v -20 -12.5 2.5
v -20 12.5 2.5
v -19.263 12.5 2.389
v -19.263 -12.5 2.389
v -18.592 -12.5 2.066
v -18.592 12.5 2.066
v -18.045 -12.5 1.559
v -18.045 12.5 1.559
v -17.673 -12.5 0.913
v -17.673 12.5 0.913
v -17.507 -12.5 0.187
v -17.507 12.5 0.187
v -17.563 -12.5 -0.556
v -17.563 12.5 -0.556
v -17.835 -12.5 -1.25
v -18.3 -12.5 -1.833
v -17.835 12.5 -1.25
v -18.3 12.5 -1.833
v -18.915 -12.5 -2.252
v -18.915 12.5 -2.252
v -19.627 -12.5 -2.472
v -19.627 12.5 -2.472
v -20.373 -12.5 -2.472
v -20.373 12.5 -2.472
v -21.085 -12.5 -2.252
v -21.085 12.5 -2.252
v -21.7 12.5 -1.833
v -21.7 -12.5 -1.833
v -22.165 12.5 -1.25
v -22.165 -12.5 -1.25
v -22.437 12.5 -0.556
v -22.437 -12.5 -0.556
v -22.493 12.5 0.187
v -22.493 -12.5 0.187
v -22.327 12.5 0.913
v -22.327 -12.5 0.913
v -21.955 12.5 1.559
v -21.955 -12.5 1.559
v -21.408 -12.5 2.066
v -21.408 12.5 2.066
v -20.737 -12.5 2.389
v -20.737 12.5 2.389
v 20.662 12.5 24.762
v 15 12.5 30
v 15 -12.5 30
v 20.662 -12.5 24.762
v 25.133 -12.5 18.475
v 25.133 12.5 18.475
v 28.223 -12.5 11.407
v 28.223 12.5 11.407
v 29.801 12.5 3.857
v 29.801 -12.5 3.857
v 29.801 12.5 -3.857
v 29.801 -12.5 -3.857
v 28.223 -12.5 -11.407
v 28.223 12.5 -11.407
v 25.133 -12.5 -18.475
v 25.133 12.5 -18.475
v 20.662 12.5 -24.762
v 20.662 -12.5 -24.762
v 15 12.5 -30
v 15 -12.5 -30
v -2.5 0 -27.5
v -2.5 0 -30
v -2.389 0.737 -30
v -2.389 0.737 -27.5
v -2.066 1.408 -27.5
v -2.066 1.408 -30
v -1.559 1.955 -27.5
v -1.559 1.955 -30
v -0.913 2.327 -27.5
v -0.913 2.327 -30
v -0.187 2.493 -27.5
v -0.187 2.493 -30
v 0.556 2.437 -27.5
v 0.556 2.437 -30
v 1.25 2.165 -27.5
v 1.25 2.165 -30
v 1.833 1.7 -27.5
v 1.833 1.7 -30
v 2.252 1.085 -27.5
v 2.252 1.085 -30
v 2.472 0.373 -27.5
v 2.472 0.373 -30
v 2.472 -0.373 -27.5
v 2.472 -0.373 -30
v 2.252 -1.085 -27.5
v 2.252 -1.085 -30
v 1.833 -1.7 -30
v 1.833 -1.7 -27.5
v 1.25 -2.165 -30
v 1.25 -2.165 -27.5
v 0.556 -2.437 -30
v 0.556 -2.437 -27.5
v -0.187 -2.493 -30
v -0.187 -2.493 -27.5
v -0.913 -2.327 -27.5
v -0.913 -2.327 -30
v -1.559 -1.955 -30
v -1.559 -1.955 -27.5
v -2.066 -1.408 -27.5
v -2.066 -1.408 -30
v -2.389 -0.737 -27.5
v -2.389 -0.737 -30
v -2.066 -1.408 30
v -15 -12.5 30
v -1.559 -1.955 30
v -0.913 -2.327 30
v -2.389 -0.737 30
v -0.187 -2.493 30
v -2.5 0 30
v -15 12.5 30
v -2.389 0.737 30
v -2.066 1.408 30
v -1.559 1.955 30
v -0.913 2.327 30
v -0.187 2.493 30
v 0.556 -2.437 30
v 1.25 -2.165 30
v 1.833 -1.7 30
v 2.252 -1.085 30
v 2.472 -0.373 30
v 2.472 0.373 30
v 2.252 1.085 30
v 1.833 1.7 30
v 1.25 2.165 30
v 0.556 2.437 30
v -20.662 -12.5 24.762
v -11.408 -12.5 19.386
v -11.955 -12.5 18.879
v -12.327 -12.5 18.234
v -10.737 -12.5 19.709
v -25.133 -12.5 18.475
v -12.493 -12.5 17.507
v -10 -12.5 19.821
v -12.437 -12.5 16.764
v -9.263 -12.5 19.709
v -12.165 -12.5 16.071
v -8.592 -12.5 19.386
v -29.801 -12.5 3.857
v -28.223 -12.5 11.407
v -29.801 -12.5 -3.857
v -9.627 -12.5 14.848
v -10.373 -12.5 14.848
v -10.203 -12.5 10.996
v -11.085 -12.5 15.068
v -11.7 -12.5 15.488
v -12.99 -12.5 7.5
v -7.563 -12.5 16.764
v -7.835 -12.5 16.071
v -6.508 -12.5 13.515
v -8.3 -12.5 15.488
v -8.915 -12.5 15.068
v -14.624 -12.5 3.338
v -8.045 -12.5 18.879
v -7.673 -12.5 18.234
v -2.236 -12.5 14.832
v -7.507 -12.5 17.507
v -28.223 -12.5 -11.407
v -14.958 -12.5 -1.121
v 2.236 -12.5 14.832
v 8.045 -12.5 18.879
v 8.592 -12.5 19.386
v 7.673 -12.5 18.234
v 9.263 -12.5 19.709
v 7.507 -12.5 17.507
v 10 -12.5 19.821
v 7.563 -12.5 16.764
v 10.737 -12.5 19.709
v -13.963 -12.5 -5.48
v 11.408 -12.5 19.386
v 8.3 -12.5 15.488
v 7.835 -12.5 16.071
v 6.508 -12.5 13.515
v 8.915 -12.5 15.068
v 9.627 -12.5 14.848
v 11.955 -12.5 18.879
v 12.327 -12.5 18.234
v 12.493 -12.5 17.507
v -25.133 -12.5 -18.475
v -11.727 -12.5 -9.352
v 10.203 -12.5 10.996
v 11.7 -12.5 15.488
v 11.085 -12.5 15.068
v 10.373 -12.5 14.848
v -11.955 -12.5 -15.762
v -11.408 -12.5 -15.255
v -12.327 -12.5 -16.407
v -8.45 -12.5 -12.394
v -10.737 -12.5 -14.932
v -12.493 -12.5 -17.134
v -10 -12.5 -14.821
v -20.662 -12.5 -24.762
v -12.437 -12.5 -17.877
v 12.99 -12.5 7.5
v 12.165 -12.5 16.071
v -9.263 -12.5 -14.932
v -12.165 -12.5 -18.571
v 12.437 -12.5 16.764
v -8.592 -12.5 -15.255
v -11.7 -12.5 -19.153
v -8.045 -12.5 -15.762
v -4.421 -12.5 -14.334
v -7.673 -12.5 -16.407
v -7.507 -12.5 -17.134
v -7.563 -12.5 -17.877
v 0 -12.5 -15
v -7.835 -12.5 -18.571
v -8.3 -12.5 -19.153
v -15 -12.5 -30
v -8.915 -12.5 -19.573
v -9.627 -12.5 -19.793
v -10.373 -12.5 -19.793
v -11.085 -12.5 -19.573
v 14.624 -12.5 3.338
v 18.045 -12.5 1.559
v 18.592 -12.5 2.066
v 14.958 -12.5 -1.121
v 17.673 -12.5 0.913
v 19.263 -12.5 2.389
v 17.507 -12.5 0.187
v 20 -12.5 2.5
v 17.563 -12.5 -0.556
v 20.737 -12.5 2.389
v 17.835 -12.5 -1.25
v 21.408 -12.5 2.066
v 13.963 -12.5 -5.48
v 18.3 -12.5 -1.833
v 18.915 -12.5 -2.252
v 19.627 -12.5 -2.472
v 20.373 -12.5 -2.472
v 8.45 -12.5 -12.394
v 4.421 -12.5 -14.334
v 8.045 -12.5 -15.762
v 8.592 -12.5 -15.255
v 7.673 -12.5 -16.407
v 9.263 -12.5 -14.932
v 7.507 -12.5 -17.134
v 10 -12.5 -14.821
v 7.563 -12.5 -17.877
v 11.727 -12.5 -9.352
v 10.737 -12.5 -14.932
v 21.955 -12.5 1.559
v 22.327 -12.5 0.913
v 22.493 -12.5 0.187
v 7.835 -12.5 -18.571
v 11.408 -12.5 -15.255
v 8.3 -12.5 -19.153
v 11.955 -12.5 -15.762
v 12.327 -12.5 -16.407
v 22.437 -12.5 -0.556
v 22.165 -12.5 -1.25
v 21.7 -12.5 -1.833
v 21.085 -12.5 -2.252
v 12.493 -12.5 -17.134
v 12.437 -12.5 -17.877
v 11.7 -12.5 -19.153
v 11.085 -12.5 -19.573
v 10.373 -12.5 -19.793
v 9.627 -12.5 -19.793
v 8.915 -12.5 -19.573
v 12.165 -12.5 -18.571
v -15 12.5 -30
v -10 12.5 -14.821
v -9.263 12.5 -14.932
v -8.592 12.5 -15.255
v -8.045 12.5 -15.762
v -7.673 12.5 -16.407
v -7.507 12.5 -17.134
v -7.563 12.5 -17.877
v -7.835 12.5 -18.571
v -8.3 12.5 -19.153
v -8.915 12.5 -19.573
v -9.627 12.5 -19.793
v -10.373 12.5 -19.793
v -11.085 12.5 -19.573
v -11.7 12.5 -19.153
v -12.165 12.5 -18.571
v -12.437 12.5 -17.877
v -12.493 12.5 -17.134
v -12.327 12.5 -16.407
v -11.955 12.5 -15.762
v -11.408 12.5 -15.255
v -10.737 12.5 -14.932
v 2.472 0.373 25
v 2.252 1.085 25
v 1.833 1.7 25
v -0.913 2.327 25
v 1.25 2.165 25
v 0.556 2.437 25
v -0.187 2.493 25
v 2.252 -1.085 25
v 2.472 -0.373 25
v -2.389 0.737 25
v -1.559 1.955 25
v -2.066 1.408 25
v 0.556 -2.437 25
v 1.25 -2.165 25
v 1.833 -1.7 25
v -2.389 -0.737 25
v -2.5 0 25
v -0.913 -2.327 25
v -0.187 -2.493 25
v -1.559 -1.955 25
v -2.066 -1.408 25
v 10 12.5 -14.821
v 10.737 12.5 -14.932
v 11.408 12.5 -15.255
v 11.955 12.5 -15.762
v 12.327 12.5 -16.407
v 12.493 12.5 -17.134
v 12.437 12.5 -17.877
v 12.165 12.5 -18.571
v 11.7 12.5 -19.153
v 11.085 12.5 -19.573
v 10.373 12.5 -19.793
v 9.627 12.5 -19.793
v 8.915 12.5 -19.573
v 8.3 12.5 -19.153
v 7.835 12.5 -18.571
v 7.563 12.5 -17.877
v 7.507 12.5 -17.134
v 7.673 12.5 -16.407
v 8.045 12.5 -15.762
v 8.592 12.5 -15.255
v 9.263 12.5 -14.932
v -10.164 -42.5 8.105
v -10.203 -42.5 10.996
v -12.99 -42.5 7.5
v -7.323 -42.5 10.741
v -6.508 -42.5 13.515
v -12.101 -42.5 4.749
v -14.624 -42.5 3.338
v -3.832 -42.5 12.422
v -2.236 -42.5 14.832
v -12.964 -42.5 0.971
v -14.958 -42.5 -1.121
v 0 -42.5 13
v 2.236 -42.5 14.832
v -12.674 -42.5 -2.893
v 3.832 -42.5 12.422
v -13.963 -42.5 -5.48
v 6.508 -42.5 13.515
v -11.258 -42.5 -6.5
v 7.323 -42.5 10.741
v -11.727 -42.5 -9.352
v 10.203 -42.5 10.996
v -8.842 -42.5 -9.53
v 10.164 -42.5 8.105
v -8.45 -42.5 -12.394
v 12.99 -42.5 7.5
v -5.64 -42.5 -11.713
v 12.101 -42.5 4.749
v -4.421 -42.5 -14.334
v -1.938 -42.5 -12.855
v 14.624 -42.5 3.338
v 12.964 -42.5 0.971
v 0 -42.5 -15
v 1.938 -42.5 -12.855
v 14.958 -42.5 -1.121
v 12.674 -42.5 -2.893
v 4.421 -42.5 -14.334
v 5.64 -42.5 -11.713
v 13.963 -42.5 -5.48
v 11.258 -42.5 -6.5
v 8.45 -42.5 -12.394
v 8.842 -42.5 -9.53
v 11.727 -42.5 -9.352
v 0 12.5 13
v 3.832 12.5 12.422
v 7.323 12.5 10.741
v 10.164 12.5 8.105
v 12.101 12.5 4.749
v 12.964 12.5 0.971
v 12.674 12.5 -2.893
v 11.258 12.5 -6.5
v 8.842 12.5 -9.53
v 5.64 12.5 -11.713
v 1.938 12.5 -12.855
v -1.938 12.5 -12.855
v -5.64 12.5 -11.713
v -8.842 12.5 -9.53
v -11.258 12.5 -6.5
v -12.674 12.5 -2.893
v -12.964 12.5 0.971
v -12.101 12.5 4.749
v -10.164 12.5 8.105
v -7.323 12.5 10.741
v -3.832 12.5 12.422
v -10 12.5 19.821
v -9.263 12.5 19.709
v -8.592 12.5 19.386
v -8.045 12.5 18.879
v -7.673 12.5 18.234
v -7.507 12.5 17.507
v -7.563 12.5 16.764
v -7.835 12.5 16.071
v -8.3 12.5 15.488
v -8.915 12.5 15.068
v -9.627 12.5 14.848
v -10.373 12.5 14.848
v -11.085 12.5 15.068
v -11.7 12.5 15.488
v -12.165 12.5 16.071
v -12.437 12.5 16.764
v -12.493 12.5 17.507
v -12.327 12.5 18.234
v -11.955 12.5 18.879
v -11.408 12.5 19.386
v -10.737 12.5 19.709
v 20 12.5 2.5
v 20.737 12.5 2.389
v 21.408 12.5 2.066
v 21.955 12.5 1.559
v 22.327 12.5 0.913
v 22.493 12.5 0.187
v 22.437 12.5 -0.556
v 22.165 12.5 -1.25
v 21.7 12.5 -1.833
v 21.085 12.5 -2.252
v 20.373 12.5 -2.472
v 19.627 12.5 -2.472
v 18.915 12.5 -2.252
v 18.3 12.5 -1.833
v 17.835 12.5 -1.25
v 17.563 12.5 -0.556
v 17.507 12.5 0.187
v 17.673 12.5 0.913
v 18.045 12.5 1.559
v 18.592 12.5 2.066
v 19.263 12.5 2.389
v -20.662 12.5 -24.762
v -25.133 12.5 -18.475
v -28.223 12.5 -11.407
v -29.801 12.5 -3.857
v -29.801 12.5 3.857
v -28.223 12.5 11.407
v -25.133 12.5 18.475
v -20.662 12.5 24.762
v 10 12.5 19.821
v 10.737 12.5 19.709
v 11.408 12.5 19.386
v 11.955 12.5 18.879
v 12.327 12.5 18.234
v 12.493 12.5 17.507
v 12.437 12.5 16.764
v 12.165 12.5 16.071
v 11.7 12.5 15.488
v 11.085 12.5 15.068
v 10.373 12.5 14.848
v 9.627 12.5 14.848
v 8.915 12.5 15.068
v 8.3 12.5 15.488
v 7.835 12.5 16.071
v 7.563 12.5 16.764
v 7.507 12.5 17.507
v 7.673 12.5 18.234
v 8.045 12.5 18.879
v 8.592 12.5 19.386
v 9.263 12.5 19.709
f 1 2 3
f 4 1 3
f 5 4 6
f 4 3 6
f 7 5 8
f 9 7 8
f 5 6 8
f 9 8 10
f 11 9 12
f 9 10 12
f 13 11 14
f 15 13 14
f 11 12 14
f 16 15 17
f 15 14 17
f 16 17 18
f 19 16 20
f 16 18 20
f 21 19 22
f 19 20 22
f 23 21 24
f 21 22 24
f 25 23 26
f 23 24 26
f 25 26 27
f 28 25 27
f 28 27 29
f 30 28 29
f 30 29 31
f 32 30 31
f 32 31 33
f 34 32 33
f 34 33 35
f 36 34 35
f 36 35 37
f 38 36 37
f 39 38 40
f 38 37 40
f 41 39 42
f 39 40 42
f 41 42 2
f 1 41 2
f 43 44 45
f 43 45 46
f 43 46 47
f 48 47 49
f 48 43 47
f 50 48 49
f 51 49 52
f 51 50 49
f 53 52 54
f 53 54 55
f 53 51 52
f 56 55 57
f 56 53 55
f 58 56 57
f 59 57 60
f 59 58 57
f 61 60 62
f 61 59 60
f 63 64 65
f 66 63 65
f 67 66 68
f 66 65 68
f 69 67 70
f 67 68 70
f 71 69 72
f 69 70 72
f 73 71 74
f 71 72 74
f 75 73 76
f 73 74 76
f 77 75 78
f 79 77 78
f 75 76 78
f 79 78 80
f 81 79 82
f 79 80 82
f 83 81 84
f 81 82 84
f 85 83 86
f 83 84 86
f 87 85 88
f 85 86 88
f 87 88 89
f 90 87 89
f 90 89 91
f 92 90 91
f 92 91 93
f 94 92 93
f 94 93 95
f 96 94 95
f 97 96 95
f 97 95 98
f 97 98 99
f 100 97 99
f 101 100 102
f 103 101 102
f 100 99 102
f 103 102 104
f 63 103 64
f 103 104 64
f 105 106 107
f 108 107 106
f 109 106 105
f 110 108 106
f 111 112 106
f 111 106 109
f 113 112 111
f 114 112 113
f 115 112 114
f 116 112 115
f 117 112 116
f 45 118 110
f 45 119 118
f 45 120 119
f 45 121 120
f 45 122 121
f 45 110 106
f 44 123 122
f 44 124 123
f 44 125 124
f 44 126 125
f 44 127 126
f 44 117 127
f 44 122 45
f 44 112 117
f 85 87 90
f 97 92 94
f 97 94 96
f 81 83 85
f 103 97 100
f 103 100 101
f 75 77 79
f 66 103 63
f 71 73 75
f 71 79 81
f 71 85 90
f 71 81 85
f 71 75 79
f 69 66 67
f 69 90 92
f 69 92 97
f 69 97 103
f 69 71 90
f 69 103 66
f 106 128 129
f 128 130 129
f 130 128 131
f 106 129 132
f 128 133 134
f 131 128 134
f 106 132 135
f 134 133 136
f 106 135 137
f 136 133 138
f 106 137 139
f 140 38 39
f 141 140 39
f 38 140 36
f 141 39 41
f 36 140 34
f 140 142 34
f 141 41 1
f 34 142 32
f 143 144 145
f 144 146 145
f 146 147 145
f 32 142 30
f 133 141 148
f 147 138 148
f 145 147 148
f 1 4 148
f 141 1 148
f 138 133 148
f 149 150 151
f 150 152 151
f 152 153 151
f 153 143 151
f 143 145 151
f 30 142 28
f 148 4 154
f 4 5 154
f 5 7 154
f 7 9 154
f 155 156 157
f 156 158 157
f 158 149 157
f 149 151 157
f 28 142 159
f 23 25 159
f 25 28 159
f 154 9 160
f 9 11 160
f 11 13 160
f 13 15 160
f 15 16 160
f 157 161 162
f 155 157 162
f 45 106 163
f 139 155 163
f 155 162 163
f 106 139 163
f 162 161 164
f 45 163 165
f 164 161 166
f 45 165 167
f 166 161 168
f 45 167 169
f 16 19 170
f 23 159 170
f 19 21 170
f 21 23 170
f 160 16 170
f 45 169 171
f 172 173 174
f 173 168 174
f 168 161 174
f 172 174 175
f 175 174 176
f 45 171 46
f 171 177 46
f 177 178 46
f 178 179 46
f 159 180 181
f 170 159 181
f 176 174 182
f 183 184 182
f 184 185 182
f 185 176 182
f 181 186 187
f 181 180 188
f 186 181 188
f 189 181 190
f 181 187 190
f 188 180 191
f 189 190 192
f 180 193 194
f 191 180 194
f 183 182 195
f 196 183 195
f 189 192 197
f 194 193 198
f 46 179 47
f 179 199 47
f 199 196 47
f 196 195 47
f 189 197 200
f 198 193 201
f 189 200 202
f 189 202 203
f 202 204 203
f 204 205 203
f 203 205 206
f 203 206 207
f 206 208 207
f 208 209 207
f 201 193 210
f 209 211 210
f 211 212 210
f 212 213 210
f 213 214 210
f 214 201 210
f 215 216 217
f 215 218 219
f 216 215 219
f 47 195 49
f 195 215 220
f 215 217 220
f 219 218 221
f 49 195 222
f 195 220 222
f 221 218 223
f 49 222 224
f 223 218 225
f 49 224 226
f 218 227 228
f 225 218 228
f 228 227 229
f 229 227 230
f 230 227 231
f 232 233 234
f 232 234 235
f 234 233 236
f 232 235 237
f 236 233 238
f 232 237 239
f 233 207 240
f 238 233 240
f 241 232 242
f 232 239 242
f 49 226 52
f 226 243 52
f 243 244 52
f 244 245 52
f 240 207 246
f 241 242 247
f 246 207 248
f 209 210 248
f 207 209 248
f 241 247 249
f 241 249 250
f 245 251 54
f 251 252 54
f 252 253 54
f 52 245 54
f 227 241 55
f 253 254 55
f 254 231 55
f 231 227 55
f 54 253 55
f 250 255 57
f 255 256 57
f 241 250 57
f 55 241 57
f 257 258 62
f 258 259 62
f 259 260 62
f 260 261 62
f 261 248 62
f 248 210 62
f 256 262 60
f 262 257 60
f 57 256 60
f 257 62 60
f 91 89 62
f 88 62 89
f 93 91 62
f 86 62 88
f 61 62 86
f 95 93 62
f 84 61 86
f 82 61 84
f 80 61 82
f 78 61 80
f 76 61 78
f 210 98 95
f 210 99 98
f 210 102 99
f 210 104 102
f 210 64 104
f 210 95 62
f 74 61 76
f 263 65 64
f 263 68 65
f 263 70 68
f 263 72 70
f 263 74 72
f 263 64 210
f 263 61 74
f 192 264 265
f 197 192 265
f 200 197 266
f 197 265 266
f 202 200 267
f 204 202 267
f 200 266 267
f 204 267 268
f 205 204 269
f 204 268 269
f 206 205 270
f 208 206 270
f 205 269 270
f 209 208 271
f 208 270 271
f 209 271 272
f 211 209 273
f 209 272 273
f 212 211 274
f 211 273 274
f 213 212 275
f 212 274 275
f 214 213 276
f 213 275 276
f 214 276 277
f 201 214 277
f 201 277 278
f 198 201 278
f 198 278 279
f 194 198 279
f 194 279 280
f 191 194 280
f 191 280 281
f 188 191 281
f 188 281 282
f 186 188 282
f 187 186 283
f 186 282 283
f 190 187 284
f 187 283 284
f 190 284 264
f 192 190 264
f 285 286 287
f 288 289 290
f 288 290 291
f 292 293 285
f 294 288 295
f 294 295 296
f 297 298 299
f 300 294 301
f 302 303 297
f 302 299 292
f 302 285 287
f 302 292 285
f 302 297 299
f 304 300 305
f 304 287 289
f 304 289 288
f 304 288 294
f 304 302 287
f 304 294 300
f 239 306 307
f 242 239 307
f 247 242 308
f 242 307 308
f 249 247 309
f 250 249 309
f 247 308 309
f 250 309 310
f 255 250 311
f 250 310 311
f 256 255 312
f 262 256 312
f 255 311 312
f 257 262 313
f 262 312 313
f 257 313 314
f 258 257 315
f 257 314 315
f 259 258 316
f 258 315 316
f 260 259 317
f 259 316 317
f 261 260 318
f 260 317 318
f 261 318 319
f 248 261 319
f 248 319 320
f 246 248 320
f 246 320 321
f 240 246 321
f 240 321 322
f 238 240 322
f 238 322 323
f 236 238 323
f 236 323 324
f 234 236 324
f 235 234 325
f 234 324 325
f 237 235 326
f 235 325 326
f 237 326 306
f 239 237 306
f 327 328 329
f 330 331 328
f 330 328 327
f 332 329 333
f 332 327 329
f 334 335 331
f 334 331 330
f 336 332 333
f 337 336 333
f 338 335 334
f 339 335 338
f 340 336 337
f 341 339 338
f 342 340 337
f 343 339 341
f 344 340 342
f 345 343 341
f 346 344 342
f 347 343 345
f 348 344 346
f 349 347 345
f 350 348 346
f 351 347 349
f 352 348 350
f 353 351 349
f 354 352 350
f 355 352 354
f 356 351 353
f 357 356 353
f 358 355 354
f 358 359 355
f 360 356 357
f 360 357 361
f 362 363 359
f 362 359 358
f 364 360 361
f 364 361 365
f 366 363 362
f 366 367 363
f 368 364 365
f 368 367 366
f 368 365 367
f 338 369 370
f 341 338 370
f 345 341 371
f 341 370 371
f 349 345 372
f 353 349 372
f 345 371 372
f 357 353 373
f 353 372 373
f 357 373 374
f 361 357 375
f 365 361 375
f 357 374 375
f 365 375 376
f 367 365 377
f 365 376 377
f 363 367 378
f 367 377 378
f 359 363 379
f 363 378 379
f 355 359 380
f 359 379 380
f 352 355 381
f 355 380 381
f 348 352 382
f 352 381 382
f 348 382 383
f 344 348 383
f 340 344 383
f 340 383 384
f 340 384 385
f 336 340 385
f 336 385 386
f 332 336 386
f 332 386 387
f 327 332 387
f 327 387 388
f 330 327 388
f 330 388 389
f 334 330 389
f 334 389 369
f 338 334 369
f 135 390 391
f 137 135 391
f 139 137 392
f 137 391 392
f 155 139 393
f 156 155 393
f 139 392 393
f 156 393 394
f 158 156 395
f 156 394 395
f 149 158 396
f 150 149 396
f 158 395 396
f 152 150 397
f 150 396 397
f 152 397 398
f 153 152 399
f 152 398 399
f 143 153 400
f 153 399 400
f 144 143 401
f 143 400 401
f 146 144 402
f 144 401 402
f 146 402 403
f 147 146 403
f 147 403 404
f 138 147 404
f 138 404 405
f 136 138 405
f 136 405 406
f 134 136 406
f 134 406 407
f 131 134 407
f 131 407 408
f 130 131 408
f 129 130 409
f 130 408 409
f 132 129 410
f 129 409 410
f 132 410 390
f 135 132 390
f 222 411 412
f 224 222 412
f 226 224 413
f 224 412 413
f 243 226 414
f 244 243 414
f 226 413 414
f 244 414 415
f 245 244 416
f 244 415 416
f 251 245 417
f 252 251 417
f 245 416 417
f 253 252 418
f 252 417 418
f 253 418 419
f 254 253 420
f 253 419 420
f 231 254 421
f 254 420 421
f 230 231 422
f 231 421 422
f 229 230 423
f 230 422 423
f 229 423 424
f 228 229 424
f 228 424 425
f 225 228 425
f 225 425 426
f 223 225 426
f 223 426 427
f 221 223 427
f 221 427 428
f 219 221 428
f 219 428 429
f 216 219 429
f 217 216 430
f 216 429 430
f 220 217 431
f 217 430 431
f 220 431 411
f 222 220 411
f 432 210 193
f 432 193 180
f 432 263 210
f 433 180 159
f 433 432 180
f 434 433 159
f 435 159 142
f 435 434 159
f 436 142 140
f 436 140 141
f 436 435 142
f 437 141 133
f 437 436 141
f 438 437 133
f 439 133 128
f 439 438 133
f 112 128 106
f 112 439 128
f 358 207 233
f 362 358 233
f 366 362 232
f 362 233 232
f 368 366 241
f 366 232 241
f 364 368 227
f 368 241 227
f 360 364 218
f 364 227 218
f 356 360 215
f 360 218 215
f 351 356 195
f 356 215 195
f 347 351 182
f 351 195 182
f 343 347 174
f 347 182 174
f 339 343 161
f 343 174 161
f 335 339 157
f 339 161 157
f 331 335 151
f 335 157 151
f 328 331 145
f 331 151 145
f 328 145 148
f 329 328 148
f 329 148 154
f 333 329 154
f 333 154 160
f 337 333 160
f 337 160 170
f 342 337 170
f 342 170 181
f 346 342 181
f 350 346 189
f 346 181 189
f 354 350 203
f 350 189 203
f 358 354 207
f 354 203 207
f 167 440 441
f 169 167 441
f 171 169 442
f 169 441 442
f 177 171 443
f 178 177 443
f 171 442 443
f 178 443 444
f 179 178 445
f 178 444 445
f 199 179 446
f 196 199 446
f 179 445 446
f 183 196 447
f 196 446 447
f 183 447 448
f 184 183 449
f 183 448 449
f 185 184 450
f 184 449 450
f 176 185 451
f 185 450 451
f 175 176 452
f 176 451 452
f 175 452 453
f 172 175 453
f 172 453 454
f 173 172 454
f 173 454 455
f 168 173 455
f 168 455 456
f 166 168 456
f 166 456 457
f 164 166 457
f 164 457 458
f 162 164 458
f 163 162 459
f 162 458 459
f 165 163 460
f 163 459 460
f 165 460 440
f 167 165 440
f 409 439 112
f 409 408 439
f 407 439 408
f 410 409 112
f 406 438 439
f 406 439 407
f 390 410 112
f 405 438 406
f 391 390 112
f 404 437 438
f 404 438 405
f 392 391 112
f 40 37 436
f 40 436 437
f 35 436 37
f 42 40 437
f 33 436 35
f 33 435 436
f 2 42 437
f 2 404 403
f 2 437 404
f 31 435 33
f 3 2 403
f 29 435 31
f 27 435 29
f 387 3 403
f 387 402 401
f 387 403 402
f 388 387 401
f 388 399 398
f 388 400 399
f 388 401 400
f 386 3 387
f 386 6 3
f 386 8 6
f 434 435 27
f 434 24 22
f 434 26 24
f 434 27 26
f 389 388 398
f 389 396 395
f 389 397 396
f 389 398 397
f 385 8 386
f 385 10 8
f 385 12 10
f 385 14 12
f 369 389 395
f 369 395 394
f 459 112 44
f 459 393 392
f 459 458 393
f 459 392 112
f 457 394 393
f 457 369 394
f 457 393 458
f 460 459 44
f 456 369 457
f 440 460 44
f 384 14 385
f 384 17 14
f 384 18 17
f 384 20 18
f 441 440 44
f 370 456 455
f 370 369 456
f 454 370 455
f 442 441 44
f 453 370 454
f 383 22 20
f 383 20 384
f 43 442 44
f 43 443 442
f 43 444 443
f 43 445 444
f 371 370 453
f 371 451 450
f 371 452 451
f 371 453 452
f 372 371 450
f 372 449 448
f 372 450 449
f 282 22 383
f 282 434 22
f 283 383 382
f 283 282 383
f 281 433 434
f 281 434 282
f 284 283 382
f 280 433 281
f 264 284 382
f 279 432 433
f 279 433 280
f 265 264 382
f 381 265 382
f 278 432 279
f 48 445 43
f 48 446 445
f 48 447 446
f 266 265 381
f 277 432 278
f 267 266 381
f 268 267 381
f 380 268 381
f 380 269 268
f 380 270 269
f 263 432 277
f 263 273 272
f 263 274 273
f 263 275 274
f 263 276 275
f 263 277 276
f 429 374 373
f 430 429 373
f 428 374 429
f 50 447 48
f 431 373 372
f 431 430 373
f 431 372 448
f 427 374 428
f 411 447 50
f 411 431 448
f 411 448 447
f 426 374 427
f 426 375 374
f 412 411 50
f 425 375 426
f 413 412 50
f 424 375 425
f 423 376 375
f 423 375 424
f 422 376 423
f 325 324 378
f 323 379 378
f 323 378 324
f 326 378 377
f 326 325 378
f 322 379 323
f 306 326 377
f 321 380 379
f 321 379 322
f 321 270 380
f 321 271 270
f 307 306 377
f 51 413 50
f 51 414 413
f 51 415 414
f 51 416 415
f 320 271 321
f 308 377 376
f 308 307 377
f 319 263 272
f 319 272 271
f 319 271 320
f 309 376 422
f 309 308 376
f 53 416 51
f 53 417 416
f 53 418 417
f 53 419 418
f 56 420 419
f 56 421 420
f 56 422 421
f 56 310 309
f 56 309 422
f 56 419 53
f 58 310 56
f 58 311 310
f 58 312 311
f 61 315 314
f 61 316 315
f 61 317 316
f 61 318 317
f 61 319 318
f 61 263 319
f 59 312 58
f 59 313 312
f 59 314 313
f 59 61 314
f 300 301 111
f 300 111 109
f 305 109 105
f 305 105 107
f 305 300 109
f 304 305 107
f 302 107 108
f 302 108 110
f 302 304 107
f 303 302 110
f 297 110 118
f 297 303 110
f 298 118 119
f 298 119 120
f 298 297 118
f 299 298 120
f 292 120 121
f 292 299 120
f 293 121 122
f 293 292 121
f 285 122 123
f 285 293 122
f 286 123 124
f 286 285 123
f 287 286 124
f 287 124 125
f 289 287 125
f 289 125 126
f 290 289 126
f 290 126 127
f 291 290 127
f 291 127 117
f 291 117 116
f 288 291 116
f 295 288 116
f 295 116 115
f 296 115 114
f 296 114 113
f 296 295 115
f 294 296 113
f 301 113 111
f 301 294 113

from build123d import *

# Parameters (mm, degrees)
SALIENTE_EXTRUIR2_DEPTH = 12.5
CROQUIS31_R             = 15
SALIENTE_EXTRUIR3_DEPTH = 30
CROQUIS8_R              = 13
CORTAR_EXTRUIR2_DEPTH   = 100
CROQUIS33_R             = 2.5
CORTAR_EXTRUIR9_DEPTH   = 2.5
CORTAR_EXTRUIR10_START  = -5
CROQUIS34_R             = 2.5
CORTAR_EXTRUIR10_DEPTH  = 5
CROQUIS35_R             = 2.5
CORTAR_EXTRUIR11_DEPTH  = 25


with BuildPart() as part:
    # Croquis1 → Saliente-Extruir2 (new, symmetric)
    with BuildSketch(Plane(origin=(0, 0, 0), x_dir=(1, 0, 0), z_dir=(0, 1, 0))):
        with BuildLine():
            Line((-15, -30), (15, -30))
            ThreePointArc((15, -30), (30, 0), (15, 30))
            Line((15, 30), (-15, 30))
            ThreePointArc((-15, 30), (-30, 0), (-15, -30))
        make_face()
    extrude(amount=SALIENTE_EXTRUIR2_DEPTH, both=True)

    # Croquis31 → Saliente-Extruir3 (add)
    with BuildSketch(Plane(origin=(0, -12.5, 0), x_dir=(-1, 0, 0), z_dir=(0, -1, 0))):
        with Locations(Location((0, 0, 0), (0, 0, 90))):
            Circle(CROQUIS31_R)
    extrude(amount=SALIENTE_EXTRUIR3_DEPTH)

    # Croquis8 → Cortar-Extruir2 (cut)
    with BuildSketch(Plane(origin=(0, 12.5, 0), x_dir=(1, 0, 0), z_dir=(0, 1, 0))):
        with Locations(Location((0, 0, 0), (0, 0, 270))):
            Circle(CROQUIS8_R)
    extrude(amount=-CORTAR_EXTRUIR2_DEPTH, mode=Mode.SUBTRACT)

    # Croquis33 → Cortar-Extruir9 (cut, symmetric)
    with BuildSketch(Plane(origin=(0, 0, -30), x_dir=(-1, 0, 0), z_dir=(0, 0, -1))):
        Circle(CROQUIS33_R)
    extrude(amount=CORTAR_EXTRUIR9_DEPTH, both=True, mode=Mode.SUBTRACT)

    # Croquis34 → Cortar-Extruir10 (cut)
    with BuildSketch(Plane.XY.offset(30).offset(CORTAR_EXTRUIR10_START)):
        with Locations(Location((0, 0, 0), (0, 0, 180))):
            Circle(CROQUIS34_R)
    extrude(amount=CORTAR_EXTRUIR10_DEPTH, mode=Mode.SUBTRACT)

    # Croquis35 → Cortar-Extruir11 (cut)
    with BuildSketch(Plane(origin=(0, 12.5, 0), x_dir=(1, 0, 0), z_dir=(0, 1, 0))):
        with Locations(Location((20, 0, 0), (0, 0, 270))):
            Circle(CROQUIS35_R)
        with Locations(Location((-20, 0, 0), (0, 0, 270))):
            Circle(CROQUIS35_R)
        with Locations(Location((-10, 17.320508076, 0), (0, 0, 270))):
            Circle(CROQUIS35_R)
        with Locations(Location((10, 17.320508076, 0), (0, 0, 270))):
            Circle(CROQUIS35_R)
        with Locations(Location((10, -17.320508076, 0), (0, 0, 270))):
            Circle(CROQUIS35_R)
        with Locations(Location((-10, -17.320508076, 0), (0, 0, 270))):
            Circle(CROQUIS35_R)
    extrude(amount=-CORTAR_EXTRUIR11_DEPTH, mode=Mode.SUBTRACT)


solid = part.part
